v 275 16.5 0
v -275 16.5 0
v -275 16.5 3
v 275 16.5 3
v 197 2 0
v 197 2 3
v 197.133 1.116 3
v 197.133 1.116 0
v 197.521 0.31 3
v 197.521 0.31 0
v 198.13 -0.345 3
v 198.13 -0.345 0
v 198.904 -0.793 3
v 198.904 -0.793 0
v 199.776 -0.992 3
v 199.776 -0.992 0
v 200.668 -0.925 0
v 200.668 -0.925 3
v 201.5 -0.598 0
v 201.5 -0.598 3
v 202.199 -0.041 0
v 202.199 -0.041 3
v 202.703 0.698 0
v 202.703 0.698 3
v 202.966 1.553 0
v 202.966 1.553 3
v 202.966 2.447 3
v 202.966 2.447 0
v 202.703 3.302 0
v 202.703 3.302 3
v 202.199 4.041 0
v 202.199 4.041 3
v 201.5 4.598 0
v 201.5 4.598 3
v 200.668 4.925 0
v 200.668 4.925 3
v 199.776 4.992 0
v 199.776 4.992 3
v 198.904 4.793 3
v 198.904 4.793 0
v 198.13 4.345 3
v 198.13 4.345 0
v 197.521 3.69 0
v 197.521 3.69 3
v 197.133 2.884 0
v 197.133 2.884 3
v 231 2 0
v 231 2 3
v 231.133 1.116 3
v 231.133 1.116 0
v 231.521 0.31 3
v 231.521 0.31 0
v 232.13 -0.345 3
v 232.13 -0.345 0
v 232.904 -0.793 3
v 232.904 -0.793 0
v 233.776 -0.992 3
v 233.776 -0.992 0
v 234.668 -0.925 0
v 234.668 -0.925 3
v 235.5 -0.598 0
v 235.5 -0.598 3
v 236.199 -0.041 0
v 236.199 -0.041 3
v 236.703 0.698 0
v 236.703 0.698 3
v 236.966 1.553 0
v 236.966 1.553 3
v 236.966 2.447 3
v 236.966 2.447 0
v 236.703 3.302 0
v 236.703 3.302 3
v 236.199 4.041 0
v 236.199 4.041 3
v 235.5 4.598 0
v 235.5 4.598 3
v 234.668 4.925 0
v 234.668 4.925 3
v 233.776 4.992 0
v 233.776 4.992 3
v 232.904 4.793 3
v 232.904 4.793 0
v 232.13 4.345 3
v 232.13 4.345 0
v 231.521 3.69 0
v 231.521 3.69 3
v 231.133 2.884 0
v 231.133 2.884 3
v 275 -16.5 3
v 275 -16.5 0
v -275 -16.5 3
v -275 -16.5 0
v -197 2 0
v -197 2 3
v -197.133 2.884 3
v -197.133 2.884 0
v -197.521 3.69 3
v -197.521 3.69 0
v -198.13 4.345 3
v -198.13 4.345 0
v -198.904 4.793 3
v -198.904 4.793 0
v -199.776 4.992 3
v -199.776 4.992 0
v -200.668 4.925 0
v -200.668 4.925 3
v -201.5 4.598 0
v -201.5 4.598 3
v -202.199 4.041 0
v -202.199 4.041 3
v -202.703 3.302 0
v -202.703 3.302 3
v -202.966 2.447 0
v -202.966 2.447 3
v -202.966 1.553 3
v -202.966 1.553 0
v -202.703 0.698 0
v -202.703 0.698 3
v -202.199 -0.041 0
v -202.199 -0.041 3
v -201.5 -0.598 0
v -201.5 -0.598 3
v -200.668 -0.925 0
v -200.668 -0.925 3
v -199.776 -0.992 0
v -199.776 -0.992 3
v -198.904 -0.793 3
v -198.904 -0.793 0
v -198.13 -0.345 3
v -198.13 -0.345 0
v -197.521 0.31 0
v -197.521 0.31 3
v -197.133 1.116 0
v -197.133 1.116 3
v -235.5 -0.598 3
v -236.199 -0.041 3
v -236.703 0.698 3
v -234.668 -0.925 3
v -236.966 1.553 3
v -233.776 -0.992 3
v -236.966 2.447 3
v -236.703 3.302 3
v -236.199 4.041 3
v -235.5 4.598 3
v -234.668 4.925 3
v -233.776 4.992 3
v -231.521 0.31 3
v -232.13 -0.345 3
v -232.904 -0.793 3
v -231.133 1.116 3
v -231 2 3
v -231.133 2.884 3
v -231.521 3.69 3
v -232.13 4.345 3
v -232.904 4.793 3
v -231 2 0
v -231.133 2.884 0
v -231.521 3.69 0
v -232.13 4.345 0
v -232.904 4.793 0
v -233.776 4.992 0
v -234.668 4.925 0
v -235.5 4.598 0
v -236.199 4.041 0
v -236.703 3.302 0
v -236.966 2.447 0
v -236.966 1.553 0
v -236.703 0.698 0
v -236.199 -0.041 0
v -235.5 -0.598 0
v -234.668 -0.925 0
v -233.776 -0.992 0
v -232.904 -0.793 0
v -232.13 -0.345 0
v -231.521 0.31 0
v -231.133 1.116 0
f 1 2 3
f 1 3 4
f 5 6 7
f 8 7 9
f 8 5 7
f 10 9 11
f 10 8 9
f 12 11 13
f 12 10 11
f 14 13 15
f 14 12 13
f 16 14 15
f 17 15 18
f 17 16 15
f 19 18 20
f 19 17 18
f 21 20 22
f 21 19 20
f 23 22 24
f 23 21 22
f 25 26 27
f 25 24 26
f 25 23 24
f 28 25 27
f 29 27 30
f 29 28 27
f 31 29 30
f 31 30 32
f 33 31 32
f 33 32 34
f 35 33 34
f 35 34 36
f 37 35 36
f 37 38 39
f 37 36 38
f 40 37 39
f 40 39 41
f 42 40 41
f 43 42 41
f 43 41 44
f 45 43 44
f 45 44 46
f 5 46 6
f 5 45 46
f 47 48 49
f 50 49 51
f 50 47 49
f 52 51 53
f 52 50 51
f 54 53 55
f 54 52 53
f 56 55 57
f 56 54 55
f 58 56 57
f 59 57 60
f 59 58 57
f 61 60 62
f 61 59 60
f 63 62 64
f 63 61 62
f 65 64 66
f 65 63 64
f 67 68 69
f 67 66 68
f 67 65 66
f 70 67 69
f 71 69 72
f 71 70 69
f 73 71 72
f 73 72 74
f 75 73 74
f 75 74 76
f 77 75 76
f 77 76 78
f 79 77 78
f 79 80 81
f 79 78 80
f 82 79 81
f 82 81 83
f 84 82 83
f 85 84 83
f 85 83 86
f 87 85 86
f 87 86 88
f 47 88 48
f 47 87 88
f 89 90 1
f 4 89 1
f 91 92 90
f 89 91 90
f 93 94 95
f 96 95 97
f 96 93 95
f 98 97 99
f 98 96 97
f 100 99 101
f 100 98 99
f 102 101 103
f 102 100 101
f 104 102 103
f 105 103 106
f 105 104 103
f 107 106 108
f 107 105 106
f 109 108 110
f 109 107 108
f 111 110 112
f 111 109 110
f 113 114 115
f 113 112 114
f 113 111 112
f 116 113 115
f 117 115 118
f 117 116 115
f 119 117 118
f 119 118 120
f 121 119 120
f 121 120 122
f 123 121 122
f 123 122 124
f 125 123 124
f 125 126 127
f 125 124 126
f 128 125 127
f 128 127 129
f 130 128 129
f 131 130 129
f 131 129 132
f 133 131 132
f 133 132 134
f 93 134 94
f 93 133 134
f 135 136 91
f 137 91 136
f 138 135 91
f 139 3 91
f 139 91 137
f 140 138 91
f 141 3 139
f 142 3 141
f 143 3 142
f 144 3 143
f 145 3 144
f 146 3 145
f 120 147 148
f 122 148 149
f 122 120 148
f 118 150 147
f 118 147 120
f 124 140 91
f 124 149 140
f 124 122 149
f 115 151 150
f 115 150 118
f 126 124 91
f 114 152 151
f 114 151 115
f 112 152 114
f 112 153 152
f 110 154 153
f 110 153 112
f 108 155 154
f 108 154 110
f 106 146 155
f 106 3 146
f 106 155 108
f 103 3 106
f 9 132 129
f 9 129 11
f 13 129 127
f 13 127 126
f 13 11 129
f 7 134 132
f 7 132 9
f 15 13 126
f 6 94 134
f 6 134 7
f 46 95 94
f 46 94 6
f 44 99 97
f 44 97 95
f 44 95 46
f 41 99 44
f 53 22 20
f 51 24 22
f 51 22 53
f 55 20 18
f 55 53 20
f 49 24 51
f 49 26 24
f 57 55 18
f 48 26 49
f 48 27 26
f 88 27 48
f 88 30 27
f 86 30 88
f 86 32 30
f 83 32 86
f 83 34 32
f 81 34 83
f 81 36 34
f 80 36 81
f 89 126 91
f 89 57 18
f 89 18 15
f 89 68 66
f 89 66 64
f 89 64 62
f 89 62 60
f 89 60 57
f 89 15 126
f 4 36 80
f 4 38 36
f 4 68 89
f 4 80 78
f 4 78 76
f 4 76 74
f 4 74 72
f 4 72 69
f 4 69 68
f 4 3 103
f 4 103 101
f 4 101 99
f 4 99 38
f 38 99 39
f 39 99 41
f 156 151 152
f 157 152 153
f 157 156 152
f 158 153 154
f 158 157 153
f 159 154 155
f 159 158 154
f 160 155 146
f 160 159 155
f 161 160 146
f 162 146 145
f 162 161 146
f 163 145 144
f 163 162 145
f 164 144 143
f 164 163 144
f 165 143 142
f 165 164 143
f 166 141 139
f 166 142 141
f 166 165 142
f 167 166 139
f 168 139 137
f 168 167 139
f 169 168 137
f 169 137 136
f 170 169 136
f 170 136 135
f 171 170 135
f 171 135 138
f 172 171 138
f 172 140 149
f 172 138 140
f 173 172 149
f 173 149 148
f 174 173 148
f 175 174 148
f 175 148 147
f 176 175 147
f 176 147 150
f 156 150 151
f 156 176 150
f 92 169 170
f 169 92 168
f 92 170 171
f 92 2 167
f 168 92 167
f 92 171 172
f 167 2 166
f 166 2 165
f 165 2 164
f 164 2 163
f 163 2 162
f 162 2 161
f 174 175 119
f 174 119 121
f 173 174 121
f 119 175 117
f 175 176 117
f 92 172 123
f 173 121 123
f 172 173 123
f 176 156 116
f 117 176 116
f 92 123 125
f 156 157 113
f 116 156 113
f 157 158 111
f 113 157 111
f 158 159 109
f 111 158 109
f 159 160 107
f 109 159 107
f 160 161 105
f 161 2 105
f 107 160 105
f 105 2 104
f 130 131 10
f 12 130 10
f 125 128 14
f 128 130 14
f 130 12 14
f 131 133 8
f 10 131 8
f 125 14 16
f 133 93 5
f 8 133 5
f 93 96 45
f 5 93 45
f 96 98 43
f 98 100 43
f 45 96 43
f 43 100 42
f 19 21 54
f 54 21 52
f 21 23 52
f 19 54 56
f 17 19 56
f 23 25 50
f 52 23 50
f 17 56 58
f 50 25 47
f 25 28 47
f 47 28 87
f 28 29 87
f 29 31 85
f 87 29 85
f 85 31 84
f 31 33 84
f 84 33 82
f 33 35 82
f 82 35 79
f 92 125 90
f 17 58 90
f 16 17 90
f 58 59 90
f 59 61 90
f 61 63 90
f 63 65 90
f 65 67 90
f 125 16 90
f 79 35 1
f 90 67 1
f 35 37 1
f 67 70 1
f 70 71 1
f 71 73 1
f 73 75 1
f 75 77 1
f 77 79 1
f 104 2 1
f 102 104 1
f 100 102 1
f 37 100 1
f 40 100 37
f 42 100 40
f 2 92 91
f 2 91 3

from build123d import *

# Parameters (mm, degrees)
SKETCH_1_W          = 550
SKETCH_1_H          = 33
EXTRUDE_1_DEPTH     = 3
SKETCH_2_R          = 3
CUT_EXTRUDE_1_DEPTH = 276.510889077


with BuildPart() as part:
    # 草图1 → 凸台-拉伸1 (new body)
    with BuildSketch(Plane.XY):
        Rectangle(SKETCH_1_W, SKETCH_1_H)
    extrude(amount=EXTRUDE_1_DEPTH)

    # 草图2 → 切除-拉伸1 (cut, through all)
    with BuildSketch(Plane.XY):
        with Locations((-234, 2)):
            Circle(SKETCH_2_R)
        with Locations((-200, 2)):
            Circle(SKETCH_2_R)
        with Locations(Location((200, 2, 0), (0, 0, 180))):
            Circle(SKETCH_2_R)
        with Locations(Location((234, 2, 0), (0, 0, 180))):
            Circle(SKETCH_2_R)
    extrude(amount=CUT_EXTRUDE_1_DEPTH, mode=Mode.SUBTRACT)


solid = part.part
